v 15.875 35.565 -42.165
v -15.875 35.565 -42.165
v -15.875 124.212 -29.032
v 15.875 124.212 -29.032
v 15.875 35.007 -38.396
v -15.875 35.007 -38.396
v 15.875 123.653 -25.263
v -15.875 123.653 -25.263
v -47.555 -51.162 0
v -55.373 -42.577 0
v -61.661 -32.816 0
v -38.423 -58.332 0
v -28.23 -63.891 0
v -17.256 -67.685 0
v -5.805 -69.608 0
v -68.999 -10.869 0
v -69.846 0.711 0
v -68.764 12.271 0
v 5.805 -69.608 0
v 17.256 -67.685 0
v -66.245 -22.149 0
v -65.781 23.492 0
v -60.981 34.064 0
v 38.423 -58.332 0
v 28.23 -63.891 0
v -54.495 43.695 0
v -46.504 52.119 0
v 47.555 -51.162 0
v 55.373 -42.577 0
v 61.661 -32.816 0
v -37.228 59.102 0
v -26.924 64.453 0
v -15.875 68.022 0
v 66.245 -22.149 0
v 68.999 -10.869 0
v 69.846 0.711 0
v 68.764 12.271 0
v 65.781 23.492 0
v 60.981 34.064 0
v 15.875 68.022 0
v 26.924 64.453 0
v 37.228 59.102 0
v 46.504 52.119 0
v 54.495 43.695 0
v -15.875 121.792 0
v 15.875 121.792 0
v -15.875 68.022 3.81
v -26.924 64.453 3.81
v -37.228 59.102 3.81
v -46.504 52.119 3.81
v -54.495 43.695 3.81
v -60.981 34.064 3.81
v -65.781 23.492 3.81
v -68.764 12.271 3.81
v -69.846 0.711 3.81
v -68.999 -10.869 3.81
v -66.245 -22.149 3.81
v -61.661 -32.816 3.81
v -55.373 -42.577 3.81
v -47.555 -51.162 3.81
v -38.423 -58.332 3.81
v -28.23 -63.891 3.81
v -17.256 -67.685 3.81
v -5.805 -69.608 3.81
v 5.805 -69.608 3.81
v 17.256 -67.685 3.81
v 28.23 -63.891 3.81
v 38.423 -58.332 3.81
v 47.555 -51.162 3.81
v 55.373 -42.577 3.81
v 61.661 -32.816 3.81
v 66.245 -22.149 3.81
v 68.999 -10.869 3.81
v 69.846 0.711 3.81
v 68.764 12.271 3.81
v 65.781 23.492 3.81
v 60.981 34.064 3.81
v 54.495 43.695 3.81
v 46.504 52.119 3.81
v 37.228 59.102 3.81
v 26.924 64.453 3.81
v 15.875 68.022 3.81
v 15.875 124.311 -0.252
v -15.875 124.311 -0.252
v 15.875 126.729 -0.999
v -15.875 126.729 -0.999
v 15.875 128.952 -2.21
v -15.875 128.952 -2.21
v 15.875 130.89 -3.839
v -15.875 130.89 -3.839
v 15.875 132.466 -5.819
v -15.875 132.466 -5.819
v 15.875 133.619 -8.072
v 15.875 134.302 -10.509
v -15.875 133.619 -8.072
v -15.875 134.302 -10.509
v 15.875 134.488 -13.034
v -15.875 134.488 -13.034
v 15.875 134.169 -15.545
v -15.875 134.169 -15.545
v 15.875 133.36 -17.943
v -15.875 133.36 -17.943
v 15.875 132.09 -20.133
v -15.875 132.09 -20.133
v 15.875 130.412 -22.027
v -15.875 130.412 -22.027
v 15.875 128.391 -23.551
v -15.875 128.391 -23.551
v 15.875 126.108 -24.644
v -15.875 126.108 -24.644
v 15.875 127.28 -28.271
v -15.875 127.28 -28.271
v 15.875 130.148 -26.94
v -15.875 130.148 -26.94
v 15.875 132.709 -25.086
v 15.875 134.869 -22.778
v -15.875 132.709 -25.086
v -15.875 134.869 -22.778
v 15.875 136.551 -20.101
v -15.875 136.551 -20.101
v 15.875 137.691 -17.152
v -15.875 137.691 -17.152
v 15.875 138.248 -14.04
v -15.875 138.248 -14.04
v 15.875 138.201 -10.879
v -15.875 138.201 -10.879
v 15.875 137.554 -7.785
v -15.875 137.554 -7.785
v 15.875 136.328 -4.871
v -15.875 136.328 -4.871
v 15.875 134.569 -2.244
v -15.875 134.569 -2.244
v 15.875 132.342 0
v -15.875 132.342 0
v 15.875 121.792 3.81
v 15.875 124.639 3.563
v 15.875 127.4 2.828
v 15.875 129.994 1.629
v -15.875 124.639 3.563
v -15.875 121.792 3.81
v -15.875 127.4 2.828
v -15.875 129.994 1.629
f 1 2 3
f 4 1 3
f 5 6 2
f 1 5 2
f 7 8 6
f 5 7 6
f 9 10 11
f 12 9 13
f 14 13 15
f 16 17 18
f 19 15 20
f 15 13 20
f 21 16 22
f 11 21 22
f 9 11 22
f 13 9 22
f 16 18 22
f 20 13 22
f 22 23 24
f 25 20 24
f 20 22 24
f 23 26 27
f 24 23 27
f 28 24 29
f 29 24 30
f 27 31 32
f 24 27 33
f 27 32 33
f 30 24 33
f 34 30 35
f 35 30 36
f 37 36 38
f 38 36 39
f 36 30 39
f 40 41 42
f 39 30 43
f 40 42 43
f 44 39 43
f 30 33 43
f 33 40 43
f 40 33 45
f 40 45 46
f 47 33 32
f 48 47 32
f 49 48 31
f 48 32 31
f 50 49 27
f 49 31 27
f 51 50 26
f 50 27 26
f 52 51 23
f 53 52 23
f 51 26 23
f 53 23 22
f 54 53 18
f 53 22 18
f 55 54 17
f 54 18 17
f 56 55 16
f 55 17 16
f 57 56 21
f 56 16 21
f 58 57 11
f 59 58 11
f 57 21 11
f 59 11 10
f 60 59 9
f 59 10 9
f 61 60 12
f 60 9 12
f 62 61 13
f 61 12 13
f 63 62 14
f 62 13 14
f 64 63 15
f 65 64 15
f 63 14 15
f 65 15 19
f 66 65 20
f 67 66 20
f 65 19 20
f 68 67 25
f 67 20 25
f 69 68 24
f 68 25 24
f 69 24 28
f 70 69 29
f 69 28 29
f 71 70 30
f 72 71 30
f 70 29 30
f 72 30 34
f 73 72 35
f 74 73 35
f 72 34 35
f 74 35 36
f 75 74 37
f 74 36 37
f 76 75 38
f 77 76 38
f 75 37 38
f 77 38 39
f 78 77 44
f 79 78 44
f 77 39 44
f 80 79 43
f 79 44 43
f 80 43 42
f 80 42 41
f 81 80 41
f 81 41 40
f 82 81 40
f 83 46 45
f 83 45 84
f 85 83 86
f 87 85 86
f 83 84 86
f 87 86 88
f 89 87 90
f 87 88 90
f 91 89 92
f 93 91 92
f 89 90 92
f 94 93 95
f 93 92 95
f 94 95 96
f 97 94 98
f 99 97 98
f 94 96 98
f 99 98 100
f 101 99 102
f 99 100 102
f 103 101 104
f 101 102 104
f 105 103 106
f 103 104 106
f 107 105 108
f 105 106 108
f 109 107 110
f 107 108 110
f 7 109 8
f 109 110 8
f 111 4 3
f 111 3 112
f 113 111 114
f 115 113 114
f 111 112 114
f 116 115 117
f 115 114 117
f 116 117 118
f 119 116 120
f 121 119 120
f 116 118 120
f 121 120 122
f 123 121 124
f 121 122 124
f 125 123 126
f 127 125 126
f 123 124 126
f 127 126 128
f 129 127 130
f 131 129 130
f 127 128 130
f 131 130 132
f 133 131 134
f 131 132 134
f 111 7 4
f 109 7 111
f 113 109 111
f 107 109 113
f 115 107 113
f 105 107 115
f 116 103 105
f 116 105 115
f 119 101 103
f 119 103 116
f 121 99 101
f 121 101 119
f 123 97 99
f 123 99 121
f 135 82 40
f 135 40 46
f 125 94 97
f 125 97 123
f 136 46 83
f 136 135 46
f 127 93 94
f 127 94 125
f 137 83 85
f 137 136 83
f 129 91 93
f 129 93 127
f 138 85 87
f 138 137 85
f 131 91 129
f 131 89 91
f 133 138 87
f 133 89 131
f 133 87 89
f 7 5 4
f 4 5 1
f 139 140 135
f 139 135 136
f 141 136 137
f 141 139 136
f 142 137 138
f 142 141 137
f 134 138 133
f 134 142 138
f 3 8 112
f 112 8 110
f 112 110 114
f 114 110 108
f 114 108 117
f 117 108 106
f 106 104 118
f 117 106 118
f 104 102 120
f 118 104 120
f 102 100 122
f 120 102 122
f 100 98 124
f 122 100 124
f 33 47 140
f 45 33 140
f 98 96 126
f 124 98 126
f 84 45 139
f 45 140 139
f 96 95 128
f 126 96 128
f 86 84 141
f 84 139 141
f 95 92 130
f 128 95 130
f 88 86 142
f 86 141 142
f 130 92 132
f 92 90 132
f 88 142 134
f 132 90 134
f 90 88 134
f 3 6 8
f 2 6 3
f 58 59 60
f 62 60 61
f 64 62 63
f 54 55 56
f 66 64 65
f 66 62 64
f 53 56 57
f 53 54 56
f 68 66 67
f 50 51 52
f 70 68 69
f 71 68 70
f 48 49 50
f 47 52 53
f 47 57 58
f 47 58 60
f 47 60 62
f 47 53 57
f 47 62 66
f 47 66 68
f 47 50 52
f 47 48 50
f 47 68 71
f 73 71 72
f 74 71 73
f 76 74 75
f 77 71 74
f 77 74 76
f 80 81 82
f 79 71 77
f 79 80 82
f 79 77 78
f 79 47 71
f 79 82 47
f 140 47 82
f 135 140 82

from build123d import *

# Parameters (mm, degrees)
BASE_EXTRUDE_DEPTH     = 3.81
SKETCHED_START         = -15.875
SKETCHED_BEND1_DEPTH   = 31.75
SKETCHED_BEND1_2_DEPTH = 31.75


# Read off the part's stored shape, not the designer's step: Sketched Bend1
with BuildPart() as part:
    # Sketch1 → Base-Extrude (new body)
    with BuildSketch(Plane.XY):
        with BuildLine():
            Line((15.875, 68.022105782), (15.875, 254))
            Line((15.875, 254), (-15.875, 254))
            Line((-15.875, 254), (-15.875, 68.022105782))
            ThreePointArc((-15.875, 68.022105782), (0, -69.85), (15.875, 68.022105782))
        make_face()
    extrude(amount=BASE_EXTRUDE_DEPTH)

    # Sketched Bend1 outline → Sketched Bend1 (cut)
    with BuildSketch(Plane.YZ.offset(SKETCHED_START)):
        with BuildLine():
            ThreePointArc((121.7921973, 3.81), (127.40036545, 2.828314461), (132.341609606, 0))
            Line((132.341609606, 0), (254, 0))
            Line((254, 0), (254, 3.81))
            Line((254, 3.81), (121.7921973, 3.81))
        make_face()
    extrude(amount=SKETCHED_BEND1_DEPTH, mode=Mode.SUBTRACT)

    # Sketched Bend1 2 outline → Sketched Bend1 2 (add)
    with BuildSketch(Plane.YZ.offset(SKETCHED_START)):
        with BuildLine():
            Line((123.653365296, -25.262883972), (35.007053077, -38.395670967))
            Line((35.007053077, -38.395670967), (35.565403476, -42.164536159))
            Line((35.565403476, -42.164536159), (124.211715695, -29.031749163))
            ThreePointArc((124.211715695, -29.031749163), (137.690590482, -17.152099982), (132.341609606, 0))
            Line((132.341609606, 0), (121.7921973, 0))
            ThreePointArc((121.7921973, 0), (134.457871906, -11.766894015), (123.653365296, -25.262883972))
        make_face()
    extrude(amount=SKETCHED_BEND1_2_DEPTH)


solid = part.part
